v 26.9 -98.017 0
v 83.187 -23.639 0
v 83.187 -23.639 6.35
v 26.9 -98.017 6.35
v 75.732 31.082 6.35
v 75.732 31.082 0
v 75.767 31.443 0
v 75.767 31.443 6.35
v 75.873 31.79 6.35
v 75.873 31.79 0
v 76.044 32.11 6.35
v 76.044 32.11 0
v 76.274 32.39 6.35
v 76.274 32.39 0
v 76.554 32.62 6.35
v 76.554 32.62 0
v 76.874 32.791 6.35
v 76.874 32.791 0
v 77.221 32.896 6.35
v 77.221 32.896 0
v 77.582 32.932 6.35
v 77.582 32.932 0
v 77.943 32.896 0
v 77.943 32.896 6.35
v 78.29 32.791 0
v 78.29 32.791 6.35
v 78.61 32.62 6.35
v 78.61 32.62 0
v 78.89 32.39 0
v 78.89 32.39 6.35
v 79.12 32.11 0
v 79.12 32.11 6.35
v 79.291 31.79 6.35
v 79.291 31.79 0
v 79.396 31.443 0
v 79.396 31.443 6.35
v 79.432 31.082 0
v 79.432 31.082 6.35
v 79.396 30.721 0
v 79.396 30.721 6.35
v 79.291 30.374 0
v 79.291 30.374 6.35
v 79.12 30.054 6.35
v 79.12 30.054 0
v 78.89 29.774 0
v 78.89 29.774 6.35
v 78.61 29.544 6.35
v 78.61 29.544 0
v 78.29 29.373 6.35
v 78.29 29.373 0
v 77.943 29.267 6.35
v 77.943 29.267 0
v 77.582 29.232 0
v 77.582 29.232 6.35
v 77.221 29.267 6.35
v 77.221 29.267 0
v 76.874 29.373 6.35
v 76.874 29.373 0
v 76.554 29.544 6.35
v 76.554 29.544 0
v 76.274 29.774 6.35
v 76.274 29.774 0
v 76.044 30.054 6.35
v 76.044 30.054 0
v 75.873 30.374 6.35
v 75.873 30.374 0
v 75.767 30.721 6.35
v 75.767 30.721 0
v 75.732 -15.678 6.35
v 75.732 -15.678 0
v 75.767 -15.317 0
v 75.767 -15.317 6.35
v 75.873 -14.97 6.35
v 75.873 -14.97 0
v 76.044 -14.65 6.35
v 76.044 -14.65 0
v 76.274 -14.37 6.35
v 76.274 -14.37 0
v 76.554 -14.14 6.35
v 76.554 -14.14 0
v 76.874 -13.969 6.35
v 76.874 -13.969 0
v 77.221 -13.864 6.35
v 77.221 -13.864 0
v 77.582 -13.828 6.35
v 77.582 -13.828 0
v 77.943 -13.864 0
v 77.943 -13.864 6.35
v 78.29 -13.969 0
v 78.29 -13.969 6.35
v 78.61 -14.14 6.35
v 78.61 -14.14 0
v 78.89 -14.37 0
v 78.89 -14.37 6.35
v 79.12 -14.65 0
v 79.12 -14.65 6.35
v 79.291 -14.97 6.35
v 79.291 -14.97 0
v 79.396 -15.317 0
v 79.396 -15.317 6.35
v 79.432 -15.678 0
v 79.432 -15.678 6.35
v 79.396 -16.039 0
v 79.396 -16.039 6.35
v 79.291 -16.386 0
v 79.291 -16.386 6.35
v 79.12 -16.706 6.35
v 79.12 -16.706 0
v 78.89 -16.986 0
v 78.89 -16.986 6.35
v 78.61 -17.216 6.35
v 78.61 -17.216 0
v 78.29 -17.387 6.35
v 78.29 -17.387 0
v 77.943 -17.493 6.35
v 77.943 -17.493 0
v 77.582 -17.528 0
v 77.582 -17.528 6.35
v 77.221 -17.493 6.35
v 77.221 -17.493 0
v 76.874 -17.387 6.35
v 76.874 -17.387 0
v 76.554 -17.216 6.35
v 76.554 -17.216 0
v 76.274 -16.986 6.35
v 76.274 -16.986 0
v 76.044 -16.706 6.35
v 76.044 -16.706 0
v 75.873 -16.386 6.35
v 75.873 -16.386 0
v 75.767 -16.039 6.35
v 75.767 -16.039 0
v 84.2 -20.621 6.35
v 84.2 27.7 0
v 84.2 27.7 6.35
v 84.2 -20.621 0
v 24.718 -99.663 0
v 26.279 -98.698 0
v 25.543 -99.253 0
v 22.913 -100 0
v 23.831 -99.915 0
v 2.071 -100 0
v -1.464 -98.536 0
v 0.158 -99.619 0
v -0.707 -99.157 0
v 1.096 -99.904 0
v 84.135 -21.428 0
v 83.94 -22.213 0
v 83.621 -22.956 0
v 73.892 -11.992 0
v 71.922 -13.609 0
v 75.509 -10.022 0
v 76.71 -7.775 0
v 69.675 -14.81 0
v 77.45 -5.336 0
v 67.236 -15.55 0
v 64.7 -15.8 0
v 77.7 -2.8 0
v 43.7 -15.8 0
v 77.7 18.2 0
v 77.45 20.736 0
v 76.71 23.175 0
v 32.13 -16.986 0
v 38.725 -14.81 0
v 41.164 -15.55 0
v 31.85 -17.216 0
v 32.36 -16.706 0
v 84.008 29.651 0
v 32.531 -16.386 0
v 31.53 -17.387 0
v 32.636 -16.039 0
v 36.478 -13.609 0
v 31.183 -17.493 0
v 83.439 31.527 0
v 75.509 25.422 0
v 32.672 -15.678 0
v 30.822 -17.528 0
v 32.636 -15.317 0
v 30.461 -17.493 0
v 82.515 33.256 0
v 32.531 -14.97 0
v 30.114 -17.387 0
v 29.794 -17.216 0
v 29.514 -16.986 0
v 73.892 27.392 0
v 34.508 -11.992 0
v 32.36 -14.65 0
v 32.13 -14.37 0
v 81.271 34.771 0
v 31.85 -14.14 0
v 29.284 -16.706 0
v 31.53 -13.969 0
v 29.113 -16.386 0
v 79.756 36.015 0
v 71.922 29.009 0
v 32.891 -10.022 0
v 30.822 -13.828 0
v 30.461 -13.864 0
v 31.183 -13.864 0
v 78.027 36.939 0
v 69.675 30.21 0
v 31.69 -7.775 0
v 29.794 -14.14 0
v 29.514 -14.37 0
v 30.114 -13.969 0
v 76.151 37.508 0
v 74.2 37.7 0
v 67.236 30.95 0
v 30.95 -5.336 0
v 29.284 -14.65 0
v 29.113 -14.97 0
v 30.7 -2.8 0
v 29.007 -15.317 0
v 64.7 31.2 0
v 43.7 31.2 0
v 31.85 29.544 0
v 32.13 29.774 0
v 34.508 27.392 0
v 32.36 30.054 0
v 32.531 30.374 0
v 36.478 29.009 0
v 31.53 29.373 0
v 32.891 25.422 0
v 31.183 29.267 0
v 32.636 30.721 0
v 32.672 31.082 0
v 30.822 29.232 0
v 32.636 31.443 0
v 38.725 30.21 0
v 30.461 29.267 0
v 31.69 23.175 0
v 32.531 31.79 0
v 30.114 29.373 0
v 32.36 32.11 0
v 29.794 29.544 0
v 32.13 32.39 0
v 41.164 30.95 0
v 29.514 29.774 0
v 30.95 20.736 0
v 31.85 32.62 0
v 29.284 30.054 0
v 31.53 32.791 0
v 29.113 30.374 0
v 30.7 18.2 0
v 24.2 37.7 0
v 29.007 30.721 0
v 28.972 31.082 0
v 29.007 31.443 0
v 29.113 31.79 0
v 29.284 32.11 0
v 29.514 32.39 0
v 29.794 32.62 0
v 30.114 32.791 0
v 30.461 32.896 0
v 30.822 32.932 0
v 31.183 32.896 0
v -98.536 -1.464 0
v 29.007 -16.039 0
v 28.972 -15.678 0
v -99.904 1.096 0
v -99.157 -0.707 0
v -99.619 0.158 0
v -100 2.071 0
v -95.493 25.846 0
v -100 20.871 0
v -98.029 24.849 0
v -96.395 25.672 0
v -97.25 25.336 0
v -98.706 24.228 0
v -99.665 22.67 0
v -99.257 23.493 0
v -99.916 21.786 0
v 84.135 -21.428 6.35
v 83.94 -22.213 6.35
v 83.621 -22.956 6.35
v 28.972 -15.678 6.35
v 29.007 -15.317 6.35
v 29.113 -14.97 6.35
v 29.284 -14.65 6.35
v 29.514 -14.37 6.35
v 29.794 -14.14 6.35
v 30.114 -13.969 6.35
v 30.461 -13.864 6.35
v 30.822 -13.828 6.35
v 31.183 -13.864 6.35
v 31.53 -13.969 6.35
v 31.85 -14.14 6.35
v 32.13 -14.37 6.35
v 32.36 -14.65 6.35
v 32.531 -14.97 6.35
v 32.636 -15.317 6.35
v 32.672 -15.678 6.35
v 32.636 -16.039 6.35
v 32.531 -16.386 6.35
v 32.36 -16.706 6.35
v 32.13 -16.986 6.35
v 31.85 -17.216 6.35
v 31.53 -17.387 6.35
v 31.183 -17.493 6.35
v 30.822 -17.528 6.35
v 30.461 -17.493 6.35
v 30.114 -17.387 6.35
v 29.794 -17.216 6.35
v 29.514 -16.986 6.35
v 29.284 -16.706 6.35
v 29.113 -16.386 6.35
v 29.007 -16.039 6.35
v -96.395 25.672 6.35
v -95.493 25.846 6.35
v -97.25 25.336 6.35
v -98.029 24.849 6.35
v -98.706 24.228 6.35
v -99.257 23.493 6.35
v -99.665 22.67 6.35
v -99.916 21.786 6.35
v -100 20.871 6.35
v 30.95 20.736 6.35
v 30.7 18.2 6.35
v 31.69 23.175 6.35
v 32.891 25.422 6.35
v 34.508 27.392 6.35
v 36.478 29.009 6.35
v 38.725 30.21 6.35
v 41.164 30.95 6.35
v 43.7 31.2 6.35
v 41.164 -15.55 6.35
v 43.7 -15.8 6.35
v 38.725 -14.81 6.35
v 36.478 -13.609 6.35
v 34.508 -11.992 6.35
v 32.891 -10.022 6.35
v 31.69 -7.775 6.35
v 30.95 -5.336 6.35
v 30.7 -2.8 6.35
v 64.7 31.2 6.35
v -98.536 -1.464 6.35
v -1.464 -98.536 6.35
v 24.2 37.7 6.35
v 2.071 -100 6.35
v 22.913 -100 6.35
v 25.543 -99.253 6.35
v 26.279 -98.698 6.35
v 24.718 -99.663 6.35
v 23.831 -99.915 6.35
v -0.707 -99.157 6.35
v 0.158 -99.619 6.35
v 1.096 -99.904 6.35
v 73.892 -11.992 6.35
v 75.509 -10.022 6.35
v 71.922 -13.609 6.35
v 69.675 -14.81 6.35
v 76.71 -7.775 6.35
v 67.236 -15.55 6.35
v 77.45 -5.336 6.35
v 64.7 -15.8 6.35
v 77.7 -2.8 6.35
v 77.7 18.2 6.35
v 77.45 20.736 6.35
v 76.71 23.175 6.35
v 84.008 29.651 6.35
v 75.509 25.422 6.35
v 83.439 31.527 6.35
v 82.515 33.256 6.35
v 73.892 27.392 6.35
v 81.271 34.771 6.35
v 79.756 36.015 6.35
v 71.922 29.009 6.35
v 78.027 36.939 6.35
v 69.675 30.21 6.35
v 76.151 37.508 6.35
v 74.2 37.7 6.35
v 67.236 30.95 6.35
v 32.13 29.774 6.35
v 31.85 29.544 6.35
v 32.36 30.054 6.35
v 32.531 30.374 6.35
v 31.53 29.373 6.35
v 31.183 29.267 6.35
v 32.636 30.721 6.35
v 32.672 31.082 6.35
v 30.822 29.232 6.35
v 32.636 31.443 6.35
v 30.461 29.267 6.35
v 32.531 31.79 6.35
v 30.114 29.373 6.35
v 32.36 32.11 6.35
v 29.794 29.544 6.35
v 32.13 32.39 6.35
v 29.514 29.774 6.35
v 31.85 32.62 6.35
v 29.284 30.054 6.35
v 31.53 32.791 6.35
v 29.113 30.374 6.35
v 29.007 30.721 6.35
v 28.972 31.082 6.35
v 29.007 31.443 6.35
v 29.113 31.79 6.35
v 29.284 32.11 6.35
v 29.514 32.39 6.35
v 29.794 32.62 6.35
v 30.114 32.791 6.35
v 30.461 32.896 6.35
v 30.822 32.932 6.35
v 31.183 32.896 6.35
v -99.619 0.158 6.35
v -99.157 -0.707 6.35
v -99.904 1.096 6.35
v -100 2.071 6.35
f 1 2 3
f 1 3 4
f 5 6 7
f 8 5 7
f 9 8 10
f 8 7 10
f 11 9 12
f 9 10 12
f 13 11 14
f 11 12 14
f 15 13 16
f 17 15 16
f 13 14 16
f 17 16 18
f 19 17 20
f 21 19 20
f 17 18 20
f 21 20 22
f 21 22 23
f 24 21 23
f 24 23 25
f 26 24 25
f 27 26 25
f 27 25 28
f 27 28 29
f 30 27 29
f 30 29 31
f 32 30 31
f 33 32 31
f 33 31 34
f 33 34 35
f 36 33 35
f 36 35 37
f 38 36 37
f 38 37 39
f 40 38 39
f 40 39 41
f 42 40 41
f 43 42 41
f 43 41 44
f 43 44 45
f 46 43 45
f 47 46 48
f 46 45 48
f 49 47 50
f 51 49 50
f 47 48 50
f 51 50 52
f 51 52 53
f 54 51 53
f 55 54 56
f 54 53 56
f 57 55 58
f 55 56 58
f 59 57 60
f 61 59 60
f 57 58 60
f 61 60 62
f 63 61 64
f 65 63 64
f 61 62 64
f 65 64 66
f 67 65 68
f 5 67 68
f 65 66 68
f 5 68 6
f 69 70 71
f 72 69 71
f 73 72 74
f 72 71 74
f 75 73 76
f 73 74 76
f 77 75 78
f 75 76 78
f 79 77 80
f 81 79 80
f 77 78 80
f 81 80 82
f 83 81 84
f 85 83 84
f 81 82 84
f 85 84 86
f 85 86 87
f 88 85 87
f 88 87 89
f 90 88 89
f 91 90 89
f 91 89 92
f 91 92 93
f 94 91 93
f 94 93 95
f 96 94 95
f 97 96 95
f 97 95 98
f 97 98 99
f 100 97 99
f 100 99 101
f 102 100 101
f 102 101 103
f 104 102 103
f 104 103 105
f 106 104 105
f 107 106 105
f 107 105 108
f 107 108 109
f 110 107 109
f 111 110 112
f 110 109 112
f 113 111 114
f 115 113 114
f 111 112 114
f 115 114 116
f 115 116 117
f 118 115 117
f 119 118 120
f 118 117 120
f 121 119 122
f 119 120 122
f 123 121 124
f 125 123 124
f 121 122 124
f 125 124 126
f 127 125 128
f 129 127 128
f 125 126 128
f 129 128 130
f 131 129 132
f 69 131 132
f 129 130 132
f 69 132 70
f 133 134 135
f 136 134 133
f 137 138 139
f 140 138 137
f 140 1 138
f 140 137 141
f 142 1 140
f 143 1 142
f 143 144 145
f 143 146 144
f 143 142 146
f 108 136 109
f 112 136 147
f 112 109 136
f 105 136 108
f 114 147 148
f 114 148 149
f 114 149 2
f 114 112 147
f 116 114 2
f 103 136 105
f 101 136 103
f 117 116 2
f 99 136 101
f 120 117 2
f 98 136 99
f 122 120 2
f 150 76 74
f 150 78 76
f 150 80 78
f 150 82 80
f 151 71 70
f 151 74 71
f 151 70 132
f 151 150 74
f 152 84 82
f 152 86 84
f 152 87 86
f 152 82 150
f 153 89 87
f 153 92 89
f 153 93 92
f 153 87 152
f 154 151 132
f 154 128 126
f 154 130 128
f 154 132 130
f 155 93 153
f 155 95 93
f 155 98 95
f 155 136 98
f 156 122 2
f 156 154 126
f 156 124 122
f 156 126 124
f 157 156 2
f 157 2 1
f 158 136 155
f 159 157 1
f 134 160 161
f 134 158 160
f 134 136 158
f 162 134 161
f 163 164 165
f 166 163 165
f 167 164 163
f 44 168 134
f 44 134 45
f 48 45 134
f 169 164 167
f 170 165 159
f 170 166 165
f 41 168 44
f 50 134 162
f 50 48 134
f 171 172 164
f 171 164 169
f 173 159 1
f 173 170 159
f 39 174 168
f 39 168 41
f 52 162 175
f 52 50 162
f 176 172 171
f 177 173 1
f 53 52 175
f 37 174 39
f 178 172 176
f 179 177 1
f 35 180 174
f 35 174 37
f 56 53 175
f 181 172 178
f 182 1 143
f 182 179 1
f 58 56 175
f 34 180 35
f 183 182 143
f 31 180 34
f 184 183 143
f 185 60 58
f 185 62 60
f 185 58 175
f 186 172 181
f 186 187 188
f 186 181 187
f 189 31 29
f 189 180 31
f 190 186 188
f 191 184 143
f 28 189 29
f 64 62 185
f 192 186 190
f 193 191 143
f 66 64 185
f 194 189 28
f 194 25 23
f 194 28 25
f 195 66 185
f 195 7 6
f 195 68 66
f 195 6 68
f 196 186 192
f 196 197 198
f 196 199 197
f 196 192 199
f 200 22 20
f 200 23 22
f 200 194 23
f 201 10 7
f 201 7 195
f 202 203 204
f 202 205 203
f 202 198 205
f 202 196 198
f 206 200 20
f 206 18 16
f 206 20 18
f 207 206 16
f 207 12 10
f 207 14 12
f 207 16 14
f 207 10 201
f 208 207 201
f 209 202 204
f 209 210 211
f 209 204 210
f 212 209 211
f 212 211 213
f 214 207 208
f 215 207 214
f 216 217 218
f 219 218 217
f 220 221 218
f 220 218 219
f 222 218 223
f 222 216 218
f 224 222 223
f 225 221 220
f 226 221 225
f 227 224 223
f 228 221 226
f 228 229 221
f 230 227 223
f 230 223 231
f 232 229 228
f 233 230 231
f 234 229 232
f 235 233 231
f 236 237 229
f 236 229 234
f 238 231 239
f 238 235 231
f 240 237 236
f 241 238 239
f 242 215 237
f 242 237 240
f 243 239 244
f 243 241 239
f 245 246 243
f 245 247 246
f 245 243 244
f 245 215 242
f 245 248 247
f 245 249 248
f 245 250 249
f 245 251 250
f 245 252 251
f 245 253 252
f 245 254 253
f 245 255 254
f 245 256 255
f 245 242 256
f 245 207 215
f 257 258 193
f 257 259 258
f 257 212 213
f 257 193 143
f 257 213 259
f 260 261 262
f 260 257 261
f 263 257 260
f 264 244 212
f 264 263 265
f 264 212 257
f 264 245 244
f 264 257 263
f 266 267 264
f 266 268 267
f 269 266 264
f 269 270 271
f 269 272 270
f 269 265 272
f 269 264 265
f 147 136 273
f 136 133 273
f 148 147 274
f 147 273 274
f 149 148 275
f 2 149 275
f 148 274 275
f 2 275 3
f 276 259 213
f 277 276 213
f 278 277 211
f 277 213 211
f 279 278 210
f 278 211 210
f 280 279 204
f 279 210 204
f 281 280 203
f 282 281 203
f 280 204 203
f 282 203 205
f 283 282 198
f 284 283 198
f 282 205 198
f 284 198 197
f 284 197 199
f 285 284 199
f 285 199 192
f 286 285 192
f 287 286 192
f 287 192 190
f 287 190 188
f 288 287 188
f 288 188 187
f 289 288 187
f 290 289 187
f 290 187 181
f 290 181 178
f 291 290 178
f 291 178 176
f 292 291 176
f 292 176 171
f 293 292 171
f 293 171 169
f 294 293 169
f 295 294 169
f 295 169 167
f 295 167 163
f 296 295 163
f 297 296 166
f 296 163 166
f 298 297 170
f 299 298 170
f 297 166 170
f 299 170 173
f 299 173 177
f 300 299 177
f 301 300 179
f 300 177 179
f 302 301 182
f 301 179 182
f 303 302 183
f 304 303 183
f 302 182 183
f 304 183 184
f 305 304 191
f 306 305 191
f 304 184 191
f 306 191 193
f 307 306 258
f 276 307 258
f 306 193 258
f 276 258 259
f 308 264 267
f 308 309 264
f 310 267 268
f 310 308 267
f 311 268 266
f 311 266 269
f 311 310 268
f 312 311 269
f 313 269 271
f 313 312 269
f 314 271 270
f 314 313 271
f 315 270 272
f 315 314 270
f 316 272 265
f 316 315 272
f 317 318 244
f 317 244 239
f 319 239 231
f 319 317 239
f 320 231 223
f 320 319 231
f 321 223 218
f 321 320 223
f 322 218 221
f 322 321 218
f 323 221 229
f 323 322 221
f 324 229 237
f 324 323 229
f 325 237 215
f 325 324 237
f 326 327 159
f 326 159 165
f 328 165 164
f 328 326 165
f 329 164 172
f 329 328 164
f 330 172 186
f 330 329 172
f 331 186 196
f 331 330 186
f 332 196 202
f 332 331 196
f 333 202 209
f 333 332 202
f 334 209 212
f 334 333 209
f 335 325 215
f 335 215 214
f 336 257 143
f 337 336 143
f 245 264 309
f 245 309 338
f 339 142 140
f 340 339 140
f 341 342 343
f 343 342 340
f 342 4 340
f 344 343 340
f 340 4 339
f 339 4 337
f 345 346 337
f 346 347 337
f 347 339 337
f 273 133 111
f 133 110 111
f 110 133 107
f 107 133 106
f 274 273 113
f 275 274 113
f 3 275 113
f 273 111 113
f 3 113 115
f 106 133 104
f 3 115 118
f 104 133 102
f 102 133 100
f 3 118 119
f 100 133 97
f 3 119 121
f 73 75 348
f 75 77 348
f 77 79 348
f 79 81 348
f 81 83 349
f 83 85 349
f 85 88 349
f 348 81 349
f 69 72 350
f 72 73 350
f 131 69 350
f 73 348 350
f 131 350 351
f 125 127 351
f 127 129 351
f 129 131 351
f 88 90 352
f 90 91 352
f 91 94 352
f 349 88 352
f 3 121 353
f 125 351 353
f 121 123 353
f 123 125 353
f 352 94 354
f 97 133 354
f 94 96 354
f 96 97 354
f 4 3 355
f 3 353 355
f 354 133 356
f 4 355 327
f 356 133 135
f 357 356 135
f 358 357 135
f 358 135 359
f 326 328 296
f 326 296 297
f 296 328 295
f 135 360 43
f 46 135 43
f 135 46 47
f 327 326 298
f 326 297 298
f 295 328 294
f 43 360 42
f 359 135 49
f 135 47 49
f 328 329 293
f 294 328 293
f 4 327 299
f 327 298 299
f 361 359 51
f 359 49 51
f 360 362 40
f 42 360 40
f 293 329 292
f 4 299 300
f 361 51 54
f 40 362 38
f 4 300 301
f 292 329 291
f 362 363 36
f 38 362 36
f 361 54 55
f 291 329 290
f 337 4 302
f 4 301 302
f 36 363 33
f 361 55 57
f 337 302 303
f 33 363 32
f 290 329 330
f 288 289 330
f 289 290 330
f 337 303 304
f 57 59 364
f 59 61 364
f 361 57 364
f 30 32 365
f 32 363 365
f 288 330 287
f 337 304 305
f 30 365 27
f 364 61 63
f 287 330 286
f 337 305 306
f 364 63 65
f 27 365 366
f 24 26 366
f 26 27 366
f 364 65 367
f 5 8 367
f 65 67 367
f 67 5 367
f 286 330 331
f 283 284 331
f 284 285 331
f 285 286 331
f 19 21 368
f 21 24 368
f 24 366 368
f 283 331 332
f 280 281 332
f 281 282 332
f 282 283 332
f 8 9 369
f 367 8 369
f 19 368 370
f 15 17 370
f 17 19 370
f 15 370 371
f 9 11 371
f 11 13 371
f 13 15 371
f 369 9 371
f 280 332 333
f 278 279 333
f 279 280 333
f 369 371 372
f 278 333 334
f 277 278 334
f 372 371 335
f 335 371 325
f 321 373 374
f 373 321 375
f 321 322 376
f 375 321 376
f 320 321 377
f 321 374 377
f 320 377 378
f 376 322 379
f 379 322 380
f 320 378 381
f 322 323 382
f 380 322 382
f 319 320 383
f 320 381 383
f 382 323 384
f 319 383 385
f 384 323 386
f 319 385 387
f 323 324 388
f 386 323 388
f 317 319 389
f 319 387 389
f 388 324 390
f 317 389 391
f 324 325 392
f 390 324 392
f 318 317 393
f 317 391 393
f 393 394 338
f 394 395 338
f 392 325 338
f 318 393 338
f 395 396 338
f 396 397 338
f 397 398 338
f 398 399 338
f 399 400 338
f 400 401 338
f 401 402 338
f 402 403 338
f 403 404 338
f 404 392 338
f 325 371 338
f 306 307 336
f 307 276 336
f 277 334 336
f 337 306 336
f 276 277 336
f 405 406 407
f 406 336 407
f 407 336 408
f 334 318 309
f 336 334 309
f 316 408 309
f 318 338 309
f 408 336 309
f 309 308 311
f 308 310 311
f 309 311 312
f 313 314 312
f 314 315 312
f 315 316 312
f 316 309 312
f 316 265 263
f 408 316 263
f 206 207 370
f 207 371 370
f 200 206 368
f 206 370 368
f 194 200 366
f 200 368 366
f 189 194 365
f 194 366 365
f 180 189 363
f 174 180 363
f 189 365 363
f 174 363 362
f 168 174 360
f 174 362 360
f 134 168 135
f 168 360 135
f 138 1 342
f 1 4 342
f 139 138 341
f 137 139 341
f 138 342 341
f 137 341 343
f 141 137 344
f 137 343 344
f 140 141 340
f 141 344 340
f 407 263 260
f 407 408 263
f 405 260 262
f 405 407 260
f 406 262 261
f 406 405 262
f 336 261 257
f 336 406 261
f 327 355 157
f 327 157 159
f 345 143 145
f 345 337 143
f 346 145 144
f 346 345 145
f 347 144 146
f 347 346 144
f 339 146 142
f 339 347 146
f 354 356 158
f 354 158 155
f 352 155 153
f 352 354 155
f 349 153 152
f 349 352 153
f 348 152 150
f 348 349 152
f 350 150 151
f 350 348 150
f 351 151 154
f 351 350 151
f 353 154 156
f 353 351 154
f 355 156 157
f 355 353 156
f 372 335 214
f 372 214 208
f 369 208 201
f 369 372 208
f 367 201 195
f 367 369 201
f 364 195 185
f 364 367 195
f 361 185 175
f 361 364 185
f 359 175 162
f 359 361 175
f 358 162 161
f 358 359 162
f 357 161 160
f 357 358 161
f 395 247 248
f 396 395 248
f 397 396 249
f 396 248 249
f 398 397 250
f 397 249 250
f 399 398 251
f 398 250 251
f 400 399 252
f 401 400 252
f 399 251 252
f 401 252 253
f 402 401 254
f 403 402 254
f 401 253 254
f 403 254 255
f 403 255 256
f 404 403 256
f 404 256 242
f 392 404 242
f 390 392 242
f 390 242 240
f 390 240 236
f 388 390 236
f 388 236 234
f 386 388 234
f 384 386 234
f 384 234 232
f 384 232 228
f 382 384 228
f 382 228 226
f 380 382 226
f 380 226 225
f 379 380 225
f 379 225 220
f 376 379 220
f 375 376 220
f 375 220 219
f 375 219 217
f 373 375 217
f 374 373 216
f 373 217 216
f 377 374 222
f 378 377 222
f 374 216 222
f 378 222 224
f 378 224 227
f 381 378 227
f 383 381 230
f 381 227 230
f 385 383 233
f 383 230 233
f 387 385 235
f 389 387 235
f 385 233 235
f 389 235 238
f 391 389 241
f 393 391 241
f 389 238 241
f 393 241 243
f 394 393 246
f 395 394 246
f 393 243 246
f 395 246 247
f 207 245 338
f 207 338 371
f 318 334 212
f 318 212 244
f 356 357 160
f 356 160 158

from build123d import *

# Parameters (mm, degrees)
BOSS_EXTRUDE1_DEPTH = 6.35
BOSS_EXTRUDE2_DEPTH = 6.35
FILLET1_R           = 10
FILLET2_R           = 5
CUT_EXTRUDE1_DEPTH  = 7.35
SKETCH4_R           = 1.85
CUT_EXTRUDE2_DEPTH  = 7.35


with BuildPart() as part:
    # Sketch1 → Boss-Extrude1 (new body)
    with BuildSketch(Plane.XY):
        Polygon((-100, 0), (0, -100), (25.4, -100), (25.4, 25.4), (-100, 25.4), align=None)
    extrude(amount=BOSS_EXTRUDE1_DEPTH)

    # Sketch2 → Boss-Extrude2 (add)
    with BuildSketch(Plane.XY):
        Polygon((24.2, 37.7), (84.2, 37.7), (84.2, -22.3), (25.4, -100), (24.2, -22.3), (-100, 25.4), align=None)
    extrude(amount=BOSS_EXTRUDE2_DEPTH)

    # Fillet1
    fillet1_edges = [part.edges().sort_by_distance(p)[0] for p in [
        (84.2, 37.7, 3.175),
    ]]
    fillet(fillet1_edges, radius=FILLET1_R)

    # Fillet2
    fillet2_edges = [part.edges().sort_by_distance(p)[0] for p in [
        (84.2, -22.3, 3.175),
        (25.4, -100, 3.175),
        (0, -100, 3.175),
        (-100, 0, 3.175),
        (-100, 25.4, 3.175),
    ]]
    fillet(fillet2_edges, radius=FILLET2_R)

    # Sketch3 → Cut-Extrude1 (cut, through all)
    with BuildSketch(Plane.XY.offset(6.35)):
        with BuildLine():
            Line((43.7, 31.2), (64.7, 31.2))
            ThreePointArc((64.7, 31.2), (73.892388155, 27.392388155), (77.7, 18.2))
            Line((77.7, 18.2), (77.7, -2.8))
            ThreePointArc((77.7, -2.8), (73.892388155, -11.992388155), (64.7, -15.8))
            Line((64.7, -15.8), (43.7, -15.8))
            ThreePointArc((43.7, -15.8), (34.507611845, -11.992388155), (30.7, -2.8))
            Line((30.7, -2.8), (30.7, 18.2))
            ThreePointArc((30.7, 18.2), (34.507611845, 27.392388155), (43.7, 31.2))
        make_face()
    extrude(amount=-CUT_EXTRUDE1_DEPTH, mode=Mode.SUBTRACT)

    # Sketch4 → Cut-Extrude2 (cut, through all)
    with BuildSketch(Plane(origin=(0, 0, 0), x_dir=(-1, 0, 0), z_dir=(0, 0, -1))):
        with Locations((-77.581727984, 31.081727984)):
            Circle(SKETCH4_R)
        with Locations((-30.821727984, 31.081727984)):
            Circle(SKETCH4_R)
        with Locations((-30.821727984, -15.678272016)):
            Circle(SKETCH4_R)
        with Locations((-77.581727984, -15.678272016)):
            Circle(SKETCH4_R)
    extrude(amount=-CUT_EXTRUDE2_DEPTH, mode=Mode.SUBTRACT)


solid = part.part
